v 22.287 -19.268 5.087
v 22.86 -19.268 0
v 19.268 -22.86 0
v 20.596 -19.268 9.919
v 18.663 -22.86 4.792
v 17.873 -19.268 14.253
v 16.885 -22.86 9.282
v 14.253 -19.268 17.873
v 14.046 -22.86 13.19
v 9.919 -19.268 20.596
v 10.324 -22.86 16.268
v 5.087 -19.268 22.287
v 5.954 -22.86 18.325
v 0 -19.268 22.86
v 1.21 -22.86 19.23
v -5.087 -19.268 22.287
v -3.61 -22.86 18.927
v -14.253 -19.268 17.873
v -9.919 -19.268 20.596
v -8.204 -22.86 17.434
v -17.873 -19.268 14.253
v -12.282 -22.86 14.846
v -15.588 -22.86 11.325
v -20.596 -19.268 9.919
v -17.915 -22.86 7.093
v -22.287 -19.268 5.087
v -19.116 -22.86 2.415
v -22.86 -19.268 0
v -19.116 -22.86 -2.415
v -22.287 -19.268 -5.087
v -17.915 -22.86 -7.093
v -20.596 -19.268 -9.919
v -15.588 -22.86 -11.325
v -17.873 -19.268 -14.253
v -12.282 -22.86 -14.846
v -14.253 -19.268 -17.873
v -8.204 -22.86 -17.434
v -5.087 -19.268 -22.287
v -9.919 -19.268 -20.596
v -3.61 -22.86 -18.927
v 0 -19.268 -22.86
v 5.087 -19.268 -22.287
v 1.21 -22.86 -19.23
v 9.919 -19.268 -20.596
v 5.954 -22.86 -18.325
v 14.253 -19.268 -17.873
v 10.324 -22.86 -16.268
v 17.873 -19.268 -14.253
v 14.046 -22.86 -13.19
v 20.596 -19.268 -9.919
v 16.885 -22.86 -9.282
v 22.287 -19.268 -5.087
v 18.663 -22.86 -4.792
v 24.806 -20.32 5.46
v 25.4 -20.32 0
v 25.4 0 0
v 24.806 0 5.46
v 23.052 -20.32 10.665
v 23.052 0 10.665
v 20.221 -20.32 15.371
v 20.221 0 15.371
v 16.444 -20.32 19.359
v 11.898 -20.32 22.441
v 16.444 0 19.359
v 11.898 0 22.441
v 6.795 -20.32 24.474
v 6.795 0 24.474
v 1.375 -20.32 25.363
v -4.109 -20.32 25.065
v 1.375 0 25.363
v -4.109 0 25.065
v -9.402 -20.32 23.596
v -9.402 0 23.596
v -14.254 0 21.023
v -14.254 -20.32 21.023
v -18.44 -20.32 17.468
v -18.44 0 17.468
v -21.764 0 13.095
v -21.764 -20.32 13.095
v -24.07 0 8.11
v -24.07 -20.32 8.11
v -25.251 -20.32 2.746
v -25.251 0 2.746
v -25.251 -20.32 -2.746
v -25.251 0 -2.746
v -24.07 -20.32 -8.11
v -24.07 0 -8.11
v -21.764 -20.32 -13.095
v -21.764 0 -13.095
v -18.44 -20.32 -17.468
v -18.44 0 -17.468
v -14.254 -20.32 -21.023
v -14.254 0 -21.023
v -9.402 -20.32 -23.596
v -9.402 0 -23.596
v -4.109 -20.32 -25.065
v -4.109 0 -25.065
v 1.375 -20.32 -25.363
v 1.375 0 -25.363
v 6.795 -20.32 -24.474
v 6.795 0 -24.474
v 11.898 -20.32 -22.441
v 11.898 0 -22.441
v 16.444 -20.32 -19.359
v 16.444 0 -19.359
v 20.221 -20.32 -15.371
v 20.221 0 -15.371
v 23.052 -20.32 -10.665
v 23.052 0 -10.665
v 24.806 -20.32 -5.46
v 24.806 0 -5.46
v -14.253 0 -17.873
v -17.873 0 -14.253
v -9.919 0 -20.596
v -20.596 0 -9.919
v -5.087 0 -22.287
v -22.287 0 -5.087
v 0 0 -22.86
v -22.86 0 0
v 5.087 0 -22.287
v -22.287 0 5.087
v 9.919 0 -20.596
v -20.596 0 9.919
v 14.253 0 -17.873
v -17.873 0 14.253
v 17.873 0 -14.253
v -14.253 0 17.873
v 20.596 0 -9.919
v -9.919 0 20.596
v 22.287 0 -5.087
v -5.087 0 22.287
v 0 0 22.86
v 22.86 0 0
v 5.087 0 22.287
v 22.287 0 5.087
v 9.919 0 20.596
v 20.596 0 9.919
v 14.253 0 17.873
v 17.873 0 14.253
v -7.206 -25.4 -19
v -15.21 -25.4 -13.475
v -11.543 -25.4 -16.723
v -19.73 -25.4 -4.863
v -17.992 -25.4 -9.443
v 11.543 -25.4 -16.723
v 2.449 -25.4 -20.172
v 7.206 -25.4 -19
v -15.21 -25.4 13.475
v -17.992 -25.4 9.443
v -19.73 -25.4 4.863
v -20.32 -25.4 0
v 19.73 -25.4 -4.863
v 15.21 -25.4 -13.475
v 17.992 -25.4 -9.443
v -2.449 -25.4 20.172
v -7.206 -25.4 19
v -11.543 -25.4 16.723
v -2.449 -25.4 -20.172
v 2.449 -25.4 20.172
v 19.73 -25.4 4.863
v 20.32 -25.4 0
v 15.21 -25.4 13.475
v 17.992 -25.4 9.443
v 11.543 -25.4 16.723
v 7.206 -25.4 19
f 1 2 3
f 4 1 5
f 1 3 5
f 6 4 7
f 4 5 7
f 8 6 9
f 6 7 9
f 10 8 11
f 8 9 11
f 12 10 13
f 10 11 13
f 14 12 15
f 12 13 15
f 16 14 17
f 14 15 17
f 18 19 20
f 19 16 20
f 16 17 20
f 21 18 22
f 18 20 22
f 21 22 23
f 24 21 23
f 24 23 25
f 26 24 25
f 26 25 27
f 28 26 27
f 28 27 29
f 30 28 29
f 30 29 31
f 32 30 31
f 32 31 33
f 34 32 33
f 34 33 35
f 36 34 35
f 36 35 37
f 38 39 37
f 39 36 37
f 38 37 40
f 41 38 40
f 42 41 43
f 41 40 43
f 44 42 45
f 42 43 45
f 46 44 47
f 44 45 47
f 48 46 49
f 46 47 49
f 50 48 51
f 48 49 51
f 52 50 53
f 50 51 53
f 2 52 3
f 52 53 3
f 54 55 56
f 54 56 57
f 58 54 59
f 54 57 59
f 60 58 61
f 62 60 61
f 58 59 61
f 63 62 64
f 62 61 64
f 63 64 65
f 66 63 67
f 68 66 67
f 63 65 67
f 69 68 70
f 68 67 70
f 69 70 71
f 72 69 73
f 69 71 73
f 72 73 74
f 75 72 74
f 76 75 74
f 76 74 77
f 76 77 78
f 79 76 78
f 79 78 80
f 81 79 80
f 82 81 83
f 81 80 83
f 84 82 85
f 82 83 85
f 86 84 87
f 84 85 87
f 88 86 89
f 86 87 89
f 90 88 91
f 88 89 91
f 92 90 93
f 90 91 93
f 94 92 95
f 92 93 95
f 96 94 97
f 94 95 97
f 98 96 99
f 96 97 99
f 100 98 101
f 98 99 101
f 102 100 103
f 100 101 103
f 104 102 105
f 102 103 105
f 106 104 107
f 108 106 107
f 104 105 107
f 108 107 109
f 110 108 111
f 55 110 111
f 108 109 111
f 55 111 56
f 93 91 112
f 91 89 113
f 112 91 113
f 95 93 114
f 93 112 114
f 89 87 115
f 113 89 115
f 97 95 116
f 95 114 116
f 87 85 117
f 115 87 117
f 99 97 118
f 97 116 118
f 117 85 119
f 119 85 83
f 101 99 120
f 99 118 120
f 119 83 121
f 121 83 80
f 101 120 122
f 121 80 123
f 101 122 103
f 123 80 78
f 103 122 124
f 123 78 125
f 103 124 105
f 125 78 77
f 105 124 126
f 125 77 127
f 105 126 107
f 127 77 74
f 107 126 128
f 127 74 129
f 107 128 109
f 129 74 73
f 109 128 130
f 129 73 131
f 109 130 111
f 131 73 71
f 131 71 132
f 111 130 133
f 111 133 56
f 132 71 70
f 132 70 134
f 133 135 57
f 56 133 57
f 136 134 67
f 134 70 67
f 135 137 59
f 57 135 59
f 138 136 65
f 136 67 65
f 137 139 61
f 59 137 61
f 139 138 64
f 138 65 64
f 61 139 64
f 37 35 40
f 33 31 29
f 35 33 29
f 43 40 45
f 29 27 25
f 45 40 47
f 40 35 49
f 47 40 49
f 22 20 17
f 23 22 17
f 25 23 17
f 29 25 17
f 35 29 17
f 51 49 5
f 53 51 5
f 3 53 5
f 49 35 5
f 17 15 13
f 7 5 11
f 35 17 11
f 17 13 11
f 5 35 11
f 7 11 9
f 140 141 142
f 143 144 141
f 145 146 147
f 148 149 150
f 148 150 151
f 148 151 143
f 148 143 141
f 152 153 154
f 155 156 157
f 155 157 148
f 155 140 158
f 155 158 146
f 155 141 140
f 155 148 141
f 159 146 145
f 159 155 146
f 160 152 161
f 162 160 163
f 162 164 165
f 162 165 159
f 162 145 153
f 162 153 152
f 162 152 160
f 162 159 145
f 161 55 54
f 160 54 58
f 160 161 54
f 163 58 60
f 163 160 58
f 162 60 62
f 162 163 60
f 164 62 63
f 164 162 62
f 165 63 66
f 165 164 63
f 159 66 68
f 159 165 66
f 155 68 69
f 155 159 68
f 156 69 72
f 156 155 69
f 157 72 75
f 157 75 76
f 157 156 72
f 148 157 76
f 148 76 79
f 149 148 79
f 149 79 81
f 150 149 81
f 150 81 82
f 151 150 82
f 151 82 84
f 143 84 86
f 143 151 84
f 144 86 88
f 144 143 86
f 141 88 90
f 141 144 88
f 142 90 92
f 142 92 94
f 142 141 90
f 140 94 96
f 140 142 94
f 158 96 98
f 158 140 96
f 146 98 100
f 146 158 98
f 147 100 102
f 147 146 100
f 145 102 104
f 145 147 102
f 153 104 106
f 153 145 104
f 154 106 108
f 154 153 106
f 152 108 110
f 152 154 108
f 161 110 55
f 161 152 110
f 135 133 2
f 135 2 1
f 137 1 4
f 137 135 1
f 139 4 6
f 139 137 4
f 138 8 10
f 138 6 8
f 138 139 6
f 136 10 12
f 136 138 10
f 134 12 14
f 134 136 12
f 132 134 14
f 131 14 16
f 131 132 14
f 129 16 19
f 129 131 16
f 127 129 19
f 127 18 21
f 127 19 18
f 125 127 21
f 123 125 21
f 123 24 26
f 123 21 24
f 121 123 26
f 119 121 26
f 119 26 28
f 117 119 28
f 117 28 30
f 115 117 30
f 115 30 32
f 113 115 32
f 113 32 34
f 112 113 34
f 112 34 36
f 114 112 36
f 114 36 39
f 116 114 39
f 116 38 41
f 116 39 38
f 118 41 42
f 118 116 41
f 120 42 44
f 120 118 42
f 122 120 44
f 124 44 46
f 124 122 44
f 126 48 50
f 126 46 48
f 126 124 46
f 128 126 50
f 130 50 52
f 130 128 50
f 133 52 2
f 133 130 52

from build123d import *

# Parameters (mm, degrees)
F0_R     = 25.4
F1_DEPTH = 25.4
F2_SIZE  = 5.08
F3_T     = -2.54


with BuildPart() as f1:
    # F0 (on Front) → F1 (new body)
    with BuildSketch(Plane.XZ):
        Circle(F0_R)
    extrude(amount=F1_DEPTH)

    # F2
    f2_edges = [f1.edges().sort_by_distance(p)[0] for p in [
        (-25.4, -25.4, 0),
    ]]
    chamfer(f2_edges, length=F2_SIZE)

    # F3
    f3_openings = [f1.faces().sort_by_distance(p)[0] for p in [
        (0, 0, 0),
    ]]
    offset(amount=F3_T, openings=f3_openings)


solid = f1.part
